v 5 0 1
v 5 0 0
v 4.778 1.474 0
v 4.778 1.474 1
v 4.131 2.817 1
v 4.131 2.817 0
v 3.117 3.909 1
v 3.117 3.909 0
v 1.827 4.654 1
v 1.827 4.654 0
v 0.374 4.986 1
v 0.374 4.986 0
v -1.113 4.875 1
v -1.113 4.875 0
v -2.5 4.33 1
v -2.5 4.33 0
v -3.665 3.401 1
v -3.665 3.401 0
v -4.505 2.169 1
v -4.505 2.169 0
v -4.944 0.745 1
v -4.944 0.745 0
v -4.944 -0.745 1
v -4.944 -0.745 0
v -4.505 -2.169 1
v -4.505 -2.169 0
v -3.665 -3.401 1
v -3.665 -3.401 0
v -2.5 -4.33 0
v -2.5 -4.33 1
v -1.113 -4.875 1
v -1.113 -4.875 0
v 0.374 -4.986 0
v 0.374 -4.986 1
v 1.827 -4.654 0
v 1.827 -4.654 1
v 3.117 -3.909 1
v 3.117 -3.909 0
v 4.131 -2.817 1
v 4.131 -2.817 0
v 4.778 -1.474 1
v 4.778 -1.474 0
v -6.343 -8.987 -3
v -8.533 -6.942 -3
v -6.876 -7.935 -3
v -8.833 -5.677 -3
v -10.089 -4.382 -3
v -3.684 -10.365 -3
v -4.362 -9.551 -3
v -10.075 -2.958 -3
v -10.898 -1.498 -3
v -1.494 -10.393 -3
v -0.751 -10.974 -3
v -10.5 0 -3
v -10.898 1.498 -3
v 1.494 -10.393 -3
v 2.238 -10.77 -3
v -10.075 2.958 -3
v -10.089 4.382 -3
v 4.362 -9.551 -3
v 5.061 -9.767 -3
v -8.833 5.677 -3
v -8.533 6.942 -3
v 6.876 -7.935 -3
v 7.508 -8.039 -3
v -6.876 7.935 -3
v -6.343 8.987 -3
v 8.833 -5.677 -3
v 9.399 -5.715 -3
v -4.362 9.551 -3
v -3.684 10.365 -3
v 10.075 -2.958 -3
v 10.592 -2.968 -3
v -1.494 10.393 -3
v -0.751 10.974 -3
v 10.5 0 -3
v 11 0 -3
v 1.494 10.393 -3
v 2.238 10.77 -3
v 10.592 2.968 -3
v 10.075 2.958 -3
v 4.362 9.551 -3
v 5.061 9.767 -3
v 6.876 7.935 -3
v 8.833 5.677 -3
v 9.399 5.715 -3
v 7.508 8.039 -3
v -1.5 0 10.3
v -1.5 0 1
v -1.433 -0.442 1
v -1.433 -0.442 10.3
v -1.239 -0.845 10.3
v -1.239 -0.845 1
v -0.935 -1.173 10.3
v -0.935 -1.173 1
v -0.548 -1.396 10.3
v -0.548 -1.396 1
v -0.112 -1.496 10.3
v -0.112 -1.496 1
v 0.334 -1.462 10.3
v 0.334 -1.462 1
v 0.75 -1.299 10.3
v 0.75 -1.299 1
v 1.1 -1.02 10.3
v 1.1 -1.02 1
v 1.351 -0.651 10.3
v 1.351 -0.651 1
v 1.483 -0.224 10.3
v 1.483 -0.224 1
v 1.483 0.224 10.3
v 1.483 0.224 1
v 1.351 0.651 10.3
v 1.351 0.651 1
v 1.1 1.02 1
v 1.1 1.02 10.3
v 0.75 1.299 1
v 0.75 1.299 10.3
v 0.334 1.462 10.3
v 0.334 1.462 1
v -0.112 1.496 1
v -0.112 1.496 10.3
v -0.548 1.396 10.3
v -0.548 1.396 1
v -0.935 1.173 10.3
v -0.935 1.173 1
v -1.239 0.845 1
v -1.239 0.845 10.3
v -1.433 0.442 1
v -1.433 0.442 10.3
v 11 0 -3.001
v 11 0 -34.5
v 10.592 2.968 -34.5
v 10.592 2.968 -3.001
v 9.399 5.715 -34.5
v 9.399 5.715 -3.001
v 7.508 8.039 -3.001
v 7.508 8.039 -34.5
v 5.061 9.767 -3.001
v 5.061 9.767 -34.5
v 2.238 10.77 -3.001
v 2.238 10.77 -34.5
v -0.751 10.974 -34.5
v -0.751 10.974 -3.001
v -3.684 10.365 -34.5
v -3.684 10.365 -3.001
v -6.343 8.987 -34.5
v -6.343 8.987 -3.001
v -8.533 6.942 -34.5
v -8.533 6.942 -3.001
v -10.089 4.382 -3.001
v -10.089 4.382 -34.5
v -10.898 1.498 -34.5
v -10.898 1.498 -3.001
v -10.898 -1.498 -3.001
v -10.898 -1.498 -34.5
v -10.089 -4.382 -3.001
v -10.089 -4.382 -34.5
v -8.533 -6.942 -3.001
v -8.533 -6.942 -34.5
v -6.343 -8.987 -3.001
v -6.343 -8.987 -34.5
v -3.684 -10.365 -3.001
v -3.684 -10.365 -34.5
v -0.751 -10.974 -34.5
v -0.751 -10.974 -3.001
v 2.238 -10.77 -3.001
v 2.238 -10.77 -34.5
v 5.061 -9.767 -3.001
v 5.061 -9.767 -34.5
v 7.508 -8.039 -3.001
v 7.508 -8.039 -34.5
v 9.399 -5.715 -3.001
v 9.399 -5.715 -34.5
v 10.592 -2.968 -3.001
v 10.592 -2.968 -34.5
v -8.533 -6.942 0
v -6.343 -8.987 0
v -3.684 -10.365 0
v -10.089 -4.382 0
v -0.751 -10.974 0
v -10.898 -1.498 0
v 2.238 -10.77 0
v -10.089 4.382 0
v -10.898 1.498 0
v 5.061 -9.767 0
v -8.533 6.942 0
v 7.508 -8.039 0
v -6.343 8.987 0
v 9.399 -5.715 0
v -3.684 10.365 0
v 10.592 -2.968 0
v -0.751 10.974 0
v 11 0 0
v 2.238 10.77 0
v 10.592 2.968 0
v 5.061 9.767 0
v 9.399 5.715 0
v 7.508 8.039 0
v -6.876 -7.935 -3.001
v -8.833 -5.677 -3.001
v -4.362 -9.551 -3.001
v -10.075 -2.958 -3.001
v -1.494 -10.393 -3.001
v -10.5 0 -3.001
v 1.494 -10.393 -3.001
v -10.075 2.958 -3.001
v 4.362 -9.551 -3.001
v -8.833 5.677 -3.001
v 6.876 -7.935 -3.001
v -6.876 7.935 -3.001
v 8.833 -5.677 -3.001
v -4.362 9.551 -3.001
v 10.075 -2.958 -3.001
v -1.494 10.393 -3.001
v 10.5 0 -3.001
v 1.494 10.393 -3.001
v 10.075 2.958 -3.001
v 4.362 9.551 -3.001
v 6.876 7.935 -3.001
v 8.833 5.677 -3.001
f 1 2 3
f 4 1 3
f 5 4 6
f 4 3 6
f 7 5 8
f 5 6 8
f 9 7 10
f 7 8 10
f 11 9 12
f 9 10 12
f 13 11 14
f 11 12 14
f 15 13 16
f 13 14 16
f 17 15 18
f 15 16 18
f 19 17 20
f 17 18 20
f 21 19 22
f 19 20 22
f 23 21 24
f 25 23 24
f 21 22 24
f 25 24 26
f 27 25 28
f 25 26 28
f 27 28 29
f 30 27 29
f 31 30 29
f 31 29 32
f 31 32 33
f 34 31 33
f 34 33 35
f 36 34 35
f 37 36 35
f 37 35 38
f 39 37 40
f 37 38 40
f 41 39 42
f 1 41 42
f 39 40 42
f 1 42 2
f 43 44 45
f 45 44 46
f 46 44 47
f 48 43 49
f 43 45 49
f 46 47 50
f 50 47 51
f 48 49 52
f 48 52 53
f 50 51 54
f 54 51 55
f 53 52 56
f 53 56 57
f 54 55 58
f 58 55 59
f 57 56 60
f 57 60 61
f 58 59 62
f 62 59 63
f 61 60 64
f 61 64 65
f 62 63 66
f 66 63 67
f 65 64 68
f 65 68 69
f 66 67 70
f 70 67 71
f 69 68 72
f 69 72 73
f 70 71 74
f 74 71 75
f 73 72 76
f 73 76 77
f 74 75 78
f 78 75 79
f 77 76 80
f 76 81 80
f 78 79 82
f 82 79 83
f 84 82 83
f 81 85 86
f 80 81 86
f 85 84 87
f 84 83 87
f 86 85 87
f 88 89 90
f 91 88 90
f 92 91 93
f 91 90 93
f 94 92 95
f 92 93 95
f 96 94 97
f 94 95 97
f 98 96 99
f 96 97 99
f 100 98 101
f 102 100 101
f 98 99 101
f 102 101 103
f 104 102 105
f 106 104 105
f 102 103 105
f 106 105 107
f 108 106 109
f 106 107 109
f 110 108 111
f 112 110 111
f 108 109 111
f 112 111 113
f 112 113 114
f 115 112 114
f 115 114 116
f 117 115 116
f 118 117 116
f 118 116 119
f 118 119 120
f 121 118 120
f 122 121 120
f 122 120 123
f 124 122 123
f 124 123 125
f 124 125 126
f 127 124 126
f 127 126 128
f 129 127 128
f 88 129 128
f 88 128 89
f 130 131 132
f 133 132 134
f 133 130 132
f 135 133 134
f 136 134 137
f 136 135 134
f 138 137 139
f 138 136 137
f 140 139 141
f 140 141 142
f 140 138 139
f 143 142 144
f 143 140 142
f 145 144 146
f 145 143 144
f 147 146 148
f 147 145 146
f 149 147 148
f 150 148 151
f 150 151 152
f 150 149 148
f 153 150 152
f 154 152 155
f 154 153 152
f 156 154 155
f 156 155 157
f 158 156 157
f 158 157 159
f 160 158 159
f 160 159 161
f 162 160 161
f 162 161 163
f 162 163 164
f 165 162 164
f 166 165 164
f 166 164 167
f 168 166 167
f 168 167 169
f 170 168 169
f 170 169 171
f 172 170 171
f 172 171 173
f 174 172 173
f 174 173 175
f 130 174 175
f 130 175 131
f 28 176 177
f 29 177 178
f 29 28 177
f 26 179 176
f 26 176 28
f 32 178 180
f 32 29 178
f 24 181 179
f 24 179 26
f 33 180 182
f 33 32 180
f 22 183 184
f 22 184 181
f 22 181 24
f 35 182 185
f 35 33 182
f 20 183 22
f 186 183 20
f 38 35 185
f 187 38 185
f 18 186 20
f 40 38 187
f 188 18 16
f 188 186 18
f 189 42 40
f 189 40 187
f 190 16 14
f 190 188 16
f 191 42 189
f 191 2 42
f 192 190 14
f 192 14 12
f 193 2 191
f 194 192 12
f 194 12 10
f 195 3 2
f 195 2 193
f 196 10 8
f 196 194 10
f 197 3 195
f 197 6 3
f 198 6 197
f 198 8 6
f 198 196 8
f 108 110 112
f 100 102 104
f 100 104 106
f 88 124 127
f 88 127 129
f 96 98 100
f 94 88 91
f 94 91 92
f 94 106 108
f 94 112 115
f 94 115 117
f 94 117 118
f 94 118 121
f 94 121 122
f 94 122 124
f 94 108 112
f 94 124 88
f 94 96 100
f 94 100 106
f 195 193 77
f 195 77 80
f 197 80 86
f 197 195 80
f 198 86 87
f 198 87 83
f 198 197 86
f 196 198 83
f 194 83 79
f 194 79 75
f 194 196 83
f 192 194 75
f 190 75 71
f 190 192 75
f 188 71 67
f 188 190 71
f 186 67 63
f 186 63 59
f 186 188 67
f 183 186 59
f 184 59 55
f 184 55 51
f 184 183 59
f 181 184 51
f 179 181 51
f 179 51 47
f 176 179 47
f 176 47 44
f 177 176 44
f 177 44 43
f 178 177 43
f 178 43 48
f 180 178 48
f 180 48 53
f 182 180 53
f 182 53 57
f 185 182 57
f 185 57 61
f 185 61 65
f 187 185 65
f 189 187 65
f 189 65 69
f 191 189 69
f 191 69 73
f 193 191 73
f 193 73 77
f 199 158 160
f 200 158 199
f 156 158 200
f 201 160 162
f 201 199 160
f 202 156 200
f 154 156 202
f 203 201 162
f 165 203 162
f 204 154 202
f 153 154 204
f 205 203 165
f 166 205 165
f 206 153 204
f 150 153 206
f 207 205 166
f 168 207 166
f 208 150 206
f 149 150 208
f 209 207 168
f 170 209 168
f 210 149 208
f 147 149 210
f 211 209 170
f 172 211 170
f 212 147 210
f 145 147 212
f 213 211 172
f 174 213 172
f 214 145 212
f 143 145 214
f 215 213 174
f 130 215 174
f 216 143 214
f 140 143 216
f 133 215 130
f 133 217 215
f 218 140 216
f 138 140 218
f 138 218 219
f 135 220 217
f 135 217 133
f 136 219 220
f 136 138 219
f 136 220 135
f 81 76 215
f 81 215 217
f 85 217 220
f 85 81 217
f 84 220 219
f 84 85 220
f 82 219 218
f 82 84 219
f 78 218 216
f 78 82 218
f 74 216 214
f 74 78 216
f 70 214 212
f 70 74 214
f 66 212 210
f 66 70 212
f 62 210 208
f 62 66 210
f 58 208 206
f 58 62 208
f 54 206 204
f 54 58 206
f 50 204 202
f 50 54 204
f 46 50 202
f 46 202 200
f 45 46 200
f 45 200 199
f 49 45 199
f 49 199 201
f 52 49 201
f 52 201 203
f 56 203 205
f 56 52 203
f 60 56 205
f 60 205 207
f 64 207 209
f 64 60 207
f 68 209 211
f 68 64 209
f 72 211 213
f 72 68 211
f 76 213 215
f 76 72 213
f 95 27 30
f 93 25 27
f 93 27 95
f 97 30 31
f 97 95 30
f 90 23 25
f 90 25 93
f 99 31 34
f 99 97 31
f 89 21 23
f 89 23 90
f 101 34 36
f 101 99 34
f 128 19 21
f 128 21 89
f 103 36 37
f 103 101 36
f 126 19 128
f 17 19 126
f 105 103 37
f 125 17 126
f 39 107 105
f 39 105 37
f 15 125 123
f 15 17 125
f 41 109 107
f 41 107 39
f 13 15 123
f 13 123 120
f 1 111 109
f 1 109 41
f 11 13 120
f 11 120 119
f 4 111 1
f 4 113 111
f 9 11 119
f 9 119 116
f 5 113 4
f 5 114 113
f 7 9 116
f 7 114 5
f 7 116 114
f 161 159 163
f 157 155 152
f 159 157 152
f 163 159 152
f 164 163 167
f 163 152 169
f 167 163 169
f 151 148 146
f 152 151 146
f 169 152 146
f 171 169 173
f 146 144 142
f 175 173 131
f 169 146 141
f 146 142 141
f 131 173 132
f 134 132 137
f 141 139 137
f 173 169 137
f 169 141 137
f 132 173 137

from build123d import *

# Parameters (mm, degrees)
SKETCH1_R      = 11
BODY_DEPTH     = 34.5
SKETCH1_3_R    = 5
COLLAR_DEPTH   = 1
SKETCH1_4_R    = 1.5
SHAFT_DEPTH    = 10.3
CAP_START      = -3
SKETCH2_R      = 11
SKETCH2_R_2    = 10.5
CAP_RING_DEPTH = 0.001


with BuildPart() as part:
    # Sketch1 → Body (new body)
    with BuildSketch(Plane.XY):
        Circle(SKETCH1_R)
    extrude(amount=-BODY_DEPTH)

    # Sketch1<3> → Collar (add)
    with BuildSketch(Plane.XY):
        Circle(SKETCH1_3_R)
    extrude(amount=COLLAR_DEPTH)

    # Sketch1<4> → Shaft (add)
    with BuildSketch(Plane.XY):
        Circle(SKETCH1_4_R)
    extrude(amount=SHAFT_DEPTH)

    # Sketch2 → Cap Ring (cut)
    with BuildSketch(Plane.XY.offset(CAP_START)):
        Circle(SKETCH2_R)
        Circle(SKETCH2_R_2, mode=Mode.SUBTRACT)
    extrude(amount=-CAP_RING_DEPTH, mode=Mode.SUBTRACT)


solid = part.part
